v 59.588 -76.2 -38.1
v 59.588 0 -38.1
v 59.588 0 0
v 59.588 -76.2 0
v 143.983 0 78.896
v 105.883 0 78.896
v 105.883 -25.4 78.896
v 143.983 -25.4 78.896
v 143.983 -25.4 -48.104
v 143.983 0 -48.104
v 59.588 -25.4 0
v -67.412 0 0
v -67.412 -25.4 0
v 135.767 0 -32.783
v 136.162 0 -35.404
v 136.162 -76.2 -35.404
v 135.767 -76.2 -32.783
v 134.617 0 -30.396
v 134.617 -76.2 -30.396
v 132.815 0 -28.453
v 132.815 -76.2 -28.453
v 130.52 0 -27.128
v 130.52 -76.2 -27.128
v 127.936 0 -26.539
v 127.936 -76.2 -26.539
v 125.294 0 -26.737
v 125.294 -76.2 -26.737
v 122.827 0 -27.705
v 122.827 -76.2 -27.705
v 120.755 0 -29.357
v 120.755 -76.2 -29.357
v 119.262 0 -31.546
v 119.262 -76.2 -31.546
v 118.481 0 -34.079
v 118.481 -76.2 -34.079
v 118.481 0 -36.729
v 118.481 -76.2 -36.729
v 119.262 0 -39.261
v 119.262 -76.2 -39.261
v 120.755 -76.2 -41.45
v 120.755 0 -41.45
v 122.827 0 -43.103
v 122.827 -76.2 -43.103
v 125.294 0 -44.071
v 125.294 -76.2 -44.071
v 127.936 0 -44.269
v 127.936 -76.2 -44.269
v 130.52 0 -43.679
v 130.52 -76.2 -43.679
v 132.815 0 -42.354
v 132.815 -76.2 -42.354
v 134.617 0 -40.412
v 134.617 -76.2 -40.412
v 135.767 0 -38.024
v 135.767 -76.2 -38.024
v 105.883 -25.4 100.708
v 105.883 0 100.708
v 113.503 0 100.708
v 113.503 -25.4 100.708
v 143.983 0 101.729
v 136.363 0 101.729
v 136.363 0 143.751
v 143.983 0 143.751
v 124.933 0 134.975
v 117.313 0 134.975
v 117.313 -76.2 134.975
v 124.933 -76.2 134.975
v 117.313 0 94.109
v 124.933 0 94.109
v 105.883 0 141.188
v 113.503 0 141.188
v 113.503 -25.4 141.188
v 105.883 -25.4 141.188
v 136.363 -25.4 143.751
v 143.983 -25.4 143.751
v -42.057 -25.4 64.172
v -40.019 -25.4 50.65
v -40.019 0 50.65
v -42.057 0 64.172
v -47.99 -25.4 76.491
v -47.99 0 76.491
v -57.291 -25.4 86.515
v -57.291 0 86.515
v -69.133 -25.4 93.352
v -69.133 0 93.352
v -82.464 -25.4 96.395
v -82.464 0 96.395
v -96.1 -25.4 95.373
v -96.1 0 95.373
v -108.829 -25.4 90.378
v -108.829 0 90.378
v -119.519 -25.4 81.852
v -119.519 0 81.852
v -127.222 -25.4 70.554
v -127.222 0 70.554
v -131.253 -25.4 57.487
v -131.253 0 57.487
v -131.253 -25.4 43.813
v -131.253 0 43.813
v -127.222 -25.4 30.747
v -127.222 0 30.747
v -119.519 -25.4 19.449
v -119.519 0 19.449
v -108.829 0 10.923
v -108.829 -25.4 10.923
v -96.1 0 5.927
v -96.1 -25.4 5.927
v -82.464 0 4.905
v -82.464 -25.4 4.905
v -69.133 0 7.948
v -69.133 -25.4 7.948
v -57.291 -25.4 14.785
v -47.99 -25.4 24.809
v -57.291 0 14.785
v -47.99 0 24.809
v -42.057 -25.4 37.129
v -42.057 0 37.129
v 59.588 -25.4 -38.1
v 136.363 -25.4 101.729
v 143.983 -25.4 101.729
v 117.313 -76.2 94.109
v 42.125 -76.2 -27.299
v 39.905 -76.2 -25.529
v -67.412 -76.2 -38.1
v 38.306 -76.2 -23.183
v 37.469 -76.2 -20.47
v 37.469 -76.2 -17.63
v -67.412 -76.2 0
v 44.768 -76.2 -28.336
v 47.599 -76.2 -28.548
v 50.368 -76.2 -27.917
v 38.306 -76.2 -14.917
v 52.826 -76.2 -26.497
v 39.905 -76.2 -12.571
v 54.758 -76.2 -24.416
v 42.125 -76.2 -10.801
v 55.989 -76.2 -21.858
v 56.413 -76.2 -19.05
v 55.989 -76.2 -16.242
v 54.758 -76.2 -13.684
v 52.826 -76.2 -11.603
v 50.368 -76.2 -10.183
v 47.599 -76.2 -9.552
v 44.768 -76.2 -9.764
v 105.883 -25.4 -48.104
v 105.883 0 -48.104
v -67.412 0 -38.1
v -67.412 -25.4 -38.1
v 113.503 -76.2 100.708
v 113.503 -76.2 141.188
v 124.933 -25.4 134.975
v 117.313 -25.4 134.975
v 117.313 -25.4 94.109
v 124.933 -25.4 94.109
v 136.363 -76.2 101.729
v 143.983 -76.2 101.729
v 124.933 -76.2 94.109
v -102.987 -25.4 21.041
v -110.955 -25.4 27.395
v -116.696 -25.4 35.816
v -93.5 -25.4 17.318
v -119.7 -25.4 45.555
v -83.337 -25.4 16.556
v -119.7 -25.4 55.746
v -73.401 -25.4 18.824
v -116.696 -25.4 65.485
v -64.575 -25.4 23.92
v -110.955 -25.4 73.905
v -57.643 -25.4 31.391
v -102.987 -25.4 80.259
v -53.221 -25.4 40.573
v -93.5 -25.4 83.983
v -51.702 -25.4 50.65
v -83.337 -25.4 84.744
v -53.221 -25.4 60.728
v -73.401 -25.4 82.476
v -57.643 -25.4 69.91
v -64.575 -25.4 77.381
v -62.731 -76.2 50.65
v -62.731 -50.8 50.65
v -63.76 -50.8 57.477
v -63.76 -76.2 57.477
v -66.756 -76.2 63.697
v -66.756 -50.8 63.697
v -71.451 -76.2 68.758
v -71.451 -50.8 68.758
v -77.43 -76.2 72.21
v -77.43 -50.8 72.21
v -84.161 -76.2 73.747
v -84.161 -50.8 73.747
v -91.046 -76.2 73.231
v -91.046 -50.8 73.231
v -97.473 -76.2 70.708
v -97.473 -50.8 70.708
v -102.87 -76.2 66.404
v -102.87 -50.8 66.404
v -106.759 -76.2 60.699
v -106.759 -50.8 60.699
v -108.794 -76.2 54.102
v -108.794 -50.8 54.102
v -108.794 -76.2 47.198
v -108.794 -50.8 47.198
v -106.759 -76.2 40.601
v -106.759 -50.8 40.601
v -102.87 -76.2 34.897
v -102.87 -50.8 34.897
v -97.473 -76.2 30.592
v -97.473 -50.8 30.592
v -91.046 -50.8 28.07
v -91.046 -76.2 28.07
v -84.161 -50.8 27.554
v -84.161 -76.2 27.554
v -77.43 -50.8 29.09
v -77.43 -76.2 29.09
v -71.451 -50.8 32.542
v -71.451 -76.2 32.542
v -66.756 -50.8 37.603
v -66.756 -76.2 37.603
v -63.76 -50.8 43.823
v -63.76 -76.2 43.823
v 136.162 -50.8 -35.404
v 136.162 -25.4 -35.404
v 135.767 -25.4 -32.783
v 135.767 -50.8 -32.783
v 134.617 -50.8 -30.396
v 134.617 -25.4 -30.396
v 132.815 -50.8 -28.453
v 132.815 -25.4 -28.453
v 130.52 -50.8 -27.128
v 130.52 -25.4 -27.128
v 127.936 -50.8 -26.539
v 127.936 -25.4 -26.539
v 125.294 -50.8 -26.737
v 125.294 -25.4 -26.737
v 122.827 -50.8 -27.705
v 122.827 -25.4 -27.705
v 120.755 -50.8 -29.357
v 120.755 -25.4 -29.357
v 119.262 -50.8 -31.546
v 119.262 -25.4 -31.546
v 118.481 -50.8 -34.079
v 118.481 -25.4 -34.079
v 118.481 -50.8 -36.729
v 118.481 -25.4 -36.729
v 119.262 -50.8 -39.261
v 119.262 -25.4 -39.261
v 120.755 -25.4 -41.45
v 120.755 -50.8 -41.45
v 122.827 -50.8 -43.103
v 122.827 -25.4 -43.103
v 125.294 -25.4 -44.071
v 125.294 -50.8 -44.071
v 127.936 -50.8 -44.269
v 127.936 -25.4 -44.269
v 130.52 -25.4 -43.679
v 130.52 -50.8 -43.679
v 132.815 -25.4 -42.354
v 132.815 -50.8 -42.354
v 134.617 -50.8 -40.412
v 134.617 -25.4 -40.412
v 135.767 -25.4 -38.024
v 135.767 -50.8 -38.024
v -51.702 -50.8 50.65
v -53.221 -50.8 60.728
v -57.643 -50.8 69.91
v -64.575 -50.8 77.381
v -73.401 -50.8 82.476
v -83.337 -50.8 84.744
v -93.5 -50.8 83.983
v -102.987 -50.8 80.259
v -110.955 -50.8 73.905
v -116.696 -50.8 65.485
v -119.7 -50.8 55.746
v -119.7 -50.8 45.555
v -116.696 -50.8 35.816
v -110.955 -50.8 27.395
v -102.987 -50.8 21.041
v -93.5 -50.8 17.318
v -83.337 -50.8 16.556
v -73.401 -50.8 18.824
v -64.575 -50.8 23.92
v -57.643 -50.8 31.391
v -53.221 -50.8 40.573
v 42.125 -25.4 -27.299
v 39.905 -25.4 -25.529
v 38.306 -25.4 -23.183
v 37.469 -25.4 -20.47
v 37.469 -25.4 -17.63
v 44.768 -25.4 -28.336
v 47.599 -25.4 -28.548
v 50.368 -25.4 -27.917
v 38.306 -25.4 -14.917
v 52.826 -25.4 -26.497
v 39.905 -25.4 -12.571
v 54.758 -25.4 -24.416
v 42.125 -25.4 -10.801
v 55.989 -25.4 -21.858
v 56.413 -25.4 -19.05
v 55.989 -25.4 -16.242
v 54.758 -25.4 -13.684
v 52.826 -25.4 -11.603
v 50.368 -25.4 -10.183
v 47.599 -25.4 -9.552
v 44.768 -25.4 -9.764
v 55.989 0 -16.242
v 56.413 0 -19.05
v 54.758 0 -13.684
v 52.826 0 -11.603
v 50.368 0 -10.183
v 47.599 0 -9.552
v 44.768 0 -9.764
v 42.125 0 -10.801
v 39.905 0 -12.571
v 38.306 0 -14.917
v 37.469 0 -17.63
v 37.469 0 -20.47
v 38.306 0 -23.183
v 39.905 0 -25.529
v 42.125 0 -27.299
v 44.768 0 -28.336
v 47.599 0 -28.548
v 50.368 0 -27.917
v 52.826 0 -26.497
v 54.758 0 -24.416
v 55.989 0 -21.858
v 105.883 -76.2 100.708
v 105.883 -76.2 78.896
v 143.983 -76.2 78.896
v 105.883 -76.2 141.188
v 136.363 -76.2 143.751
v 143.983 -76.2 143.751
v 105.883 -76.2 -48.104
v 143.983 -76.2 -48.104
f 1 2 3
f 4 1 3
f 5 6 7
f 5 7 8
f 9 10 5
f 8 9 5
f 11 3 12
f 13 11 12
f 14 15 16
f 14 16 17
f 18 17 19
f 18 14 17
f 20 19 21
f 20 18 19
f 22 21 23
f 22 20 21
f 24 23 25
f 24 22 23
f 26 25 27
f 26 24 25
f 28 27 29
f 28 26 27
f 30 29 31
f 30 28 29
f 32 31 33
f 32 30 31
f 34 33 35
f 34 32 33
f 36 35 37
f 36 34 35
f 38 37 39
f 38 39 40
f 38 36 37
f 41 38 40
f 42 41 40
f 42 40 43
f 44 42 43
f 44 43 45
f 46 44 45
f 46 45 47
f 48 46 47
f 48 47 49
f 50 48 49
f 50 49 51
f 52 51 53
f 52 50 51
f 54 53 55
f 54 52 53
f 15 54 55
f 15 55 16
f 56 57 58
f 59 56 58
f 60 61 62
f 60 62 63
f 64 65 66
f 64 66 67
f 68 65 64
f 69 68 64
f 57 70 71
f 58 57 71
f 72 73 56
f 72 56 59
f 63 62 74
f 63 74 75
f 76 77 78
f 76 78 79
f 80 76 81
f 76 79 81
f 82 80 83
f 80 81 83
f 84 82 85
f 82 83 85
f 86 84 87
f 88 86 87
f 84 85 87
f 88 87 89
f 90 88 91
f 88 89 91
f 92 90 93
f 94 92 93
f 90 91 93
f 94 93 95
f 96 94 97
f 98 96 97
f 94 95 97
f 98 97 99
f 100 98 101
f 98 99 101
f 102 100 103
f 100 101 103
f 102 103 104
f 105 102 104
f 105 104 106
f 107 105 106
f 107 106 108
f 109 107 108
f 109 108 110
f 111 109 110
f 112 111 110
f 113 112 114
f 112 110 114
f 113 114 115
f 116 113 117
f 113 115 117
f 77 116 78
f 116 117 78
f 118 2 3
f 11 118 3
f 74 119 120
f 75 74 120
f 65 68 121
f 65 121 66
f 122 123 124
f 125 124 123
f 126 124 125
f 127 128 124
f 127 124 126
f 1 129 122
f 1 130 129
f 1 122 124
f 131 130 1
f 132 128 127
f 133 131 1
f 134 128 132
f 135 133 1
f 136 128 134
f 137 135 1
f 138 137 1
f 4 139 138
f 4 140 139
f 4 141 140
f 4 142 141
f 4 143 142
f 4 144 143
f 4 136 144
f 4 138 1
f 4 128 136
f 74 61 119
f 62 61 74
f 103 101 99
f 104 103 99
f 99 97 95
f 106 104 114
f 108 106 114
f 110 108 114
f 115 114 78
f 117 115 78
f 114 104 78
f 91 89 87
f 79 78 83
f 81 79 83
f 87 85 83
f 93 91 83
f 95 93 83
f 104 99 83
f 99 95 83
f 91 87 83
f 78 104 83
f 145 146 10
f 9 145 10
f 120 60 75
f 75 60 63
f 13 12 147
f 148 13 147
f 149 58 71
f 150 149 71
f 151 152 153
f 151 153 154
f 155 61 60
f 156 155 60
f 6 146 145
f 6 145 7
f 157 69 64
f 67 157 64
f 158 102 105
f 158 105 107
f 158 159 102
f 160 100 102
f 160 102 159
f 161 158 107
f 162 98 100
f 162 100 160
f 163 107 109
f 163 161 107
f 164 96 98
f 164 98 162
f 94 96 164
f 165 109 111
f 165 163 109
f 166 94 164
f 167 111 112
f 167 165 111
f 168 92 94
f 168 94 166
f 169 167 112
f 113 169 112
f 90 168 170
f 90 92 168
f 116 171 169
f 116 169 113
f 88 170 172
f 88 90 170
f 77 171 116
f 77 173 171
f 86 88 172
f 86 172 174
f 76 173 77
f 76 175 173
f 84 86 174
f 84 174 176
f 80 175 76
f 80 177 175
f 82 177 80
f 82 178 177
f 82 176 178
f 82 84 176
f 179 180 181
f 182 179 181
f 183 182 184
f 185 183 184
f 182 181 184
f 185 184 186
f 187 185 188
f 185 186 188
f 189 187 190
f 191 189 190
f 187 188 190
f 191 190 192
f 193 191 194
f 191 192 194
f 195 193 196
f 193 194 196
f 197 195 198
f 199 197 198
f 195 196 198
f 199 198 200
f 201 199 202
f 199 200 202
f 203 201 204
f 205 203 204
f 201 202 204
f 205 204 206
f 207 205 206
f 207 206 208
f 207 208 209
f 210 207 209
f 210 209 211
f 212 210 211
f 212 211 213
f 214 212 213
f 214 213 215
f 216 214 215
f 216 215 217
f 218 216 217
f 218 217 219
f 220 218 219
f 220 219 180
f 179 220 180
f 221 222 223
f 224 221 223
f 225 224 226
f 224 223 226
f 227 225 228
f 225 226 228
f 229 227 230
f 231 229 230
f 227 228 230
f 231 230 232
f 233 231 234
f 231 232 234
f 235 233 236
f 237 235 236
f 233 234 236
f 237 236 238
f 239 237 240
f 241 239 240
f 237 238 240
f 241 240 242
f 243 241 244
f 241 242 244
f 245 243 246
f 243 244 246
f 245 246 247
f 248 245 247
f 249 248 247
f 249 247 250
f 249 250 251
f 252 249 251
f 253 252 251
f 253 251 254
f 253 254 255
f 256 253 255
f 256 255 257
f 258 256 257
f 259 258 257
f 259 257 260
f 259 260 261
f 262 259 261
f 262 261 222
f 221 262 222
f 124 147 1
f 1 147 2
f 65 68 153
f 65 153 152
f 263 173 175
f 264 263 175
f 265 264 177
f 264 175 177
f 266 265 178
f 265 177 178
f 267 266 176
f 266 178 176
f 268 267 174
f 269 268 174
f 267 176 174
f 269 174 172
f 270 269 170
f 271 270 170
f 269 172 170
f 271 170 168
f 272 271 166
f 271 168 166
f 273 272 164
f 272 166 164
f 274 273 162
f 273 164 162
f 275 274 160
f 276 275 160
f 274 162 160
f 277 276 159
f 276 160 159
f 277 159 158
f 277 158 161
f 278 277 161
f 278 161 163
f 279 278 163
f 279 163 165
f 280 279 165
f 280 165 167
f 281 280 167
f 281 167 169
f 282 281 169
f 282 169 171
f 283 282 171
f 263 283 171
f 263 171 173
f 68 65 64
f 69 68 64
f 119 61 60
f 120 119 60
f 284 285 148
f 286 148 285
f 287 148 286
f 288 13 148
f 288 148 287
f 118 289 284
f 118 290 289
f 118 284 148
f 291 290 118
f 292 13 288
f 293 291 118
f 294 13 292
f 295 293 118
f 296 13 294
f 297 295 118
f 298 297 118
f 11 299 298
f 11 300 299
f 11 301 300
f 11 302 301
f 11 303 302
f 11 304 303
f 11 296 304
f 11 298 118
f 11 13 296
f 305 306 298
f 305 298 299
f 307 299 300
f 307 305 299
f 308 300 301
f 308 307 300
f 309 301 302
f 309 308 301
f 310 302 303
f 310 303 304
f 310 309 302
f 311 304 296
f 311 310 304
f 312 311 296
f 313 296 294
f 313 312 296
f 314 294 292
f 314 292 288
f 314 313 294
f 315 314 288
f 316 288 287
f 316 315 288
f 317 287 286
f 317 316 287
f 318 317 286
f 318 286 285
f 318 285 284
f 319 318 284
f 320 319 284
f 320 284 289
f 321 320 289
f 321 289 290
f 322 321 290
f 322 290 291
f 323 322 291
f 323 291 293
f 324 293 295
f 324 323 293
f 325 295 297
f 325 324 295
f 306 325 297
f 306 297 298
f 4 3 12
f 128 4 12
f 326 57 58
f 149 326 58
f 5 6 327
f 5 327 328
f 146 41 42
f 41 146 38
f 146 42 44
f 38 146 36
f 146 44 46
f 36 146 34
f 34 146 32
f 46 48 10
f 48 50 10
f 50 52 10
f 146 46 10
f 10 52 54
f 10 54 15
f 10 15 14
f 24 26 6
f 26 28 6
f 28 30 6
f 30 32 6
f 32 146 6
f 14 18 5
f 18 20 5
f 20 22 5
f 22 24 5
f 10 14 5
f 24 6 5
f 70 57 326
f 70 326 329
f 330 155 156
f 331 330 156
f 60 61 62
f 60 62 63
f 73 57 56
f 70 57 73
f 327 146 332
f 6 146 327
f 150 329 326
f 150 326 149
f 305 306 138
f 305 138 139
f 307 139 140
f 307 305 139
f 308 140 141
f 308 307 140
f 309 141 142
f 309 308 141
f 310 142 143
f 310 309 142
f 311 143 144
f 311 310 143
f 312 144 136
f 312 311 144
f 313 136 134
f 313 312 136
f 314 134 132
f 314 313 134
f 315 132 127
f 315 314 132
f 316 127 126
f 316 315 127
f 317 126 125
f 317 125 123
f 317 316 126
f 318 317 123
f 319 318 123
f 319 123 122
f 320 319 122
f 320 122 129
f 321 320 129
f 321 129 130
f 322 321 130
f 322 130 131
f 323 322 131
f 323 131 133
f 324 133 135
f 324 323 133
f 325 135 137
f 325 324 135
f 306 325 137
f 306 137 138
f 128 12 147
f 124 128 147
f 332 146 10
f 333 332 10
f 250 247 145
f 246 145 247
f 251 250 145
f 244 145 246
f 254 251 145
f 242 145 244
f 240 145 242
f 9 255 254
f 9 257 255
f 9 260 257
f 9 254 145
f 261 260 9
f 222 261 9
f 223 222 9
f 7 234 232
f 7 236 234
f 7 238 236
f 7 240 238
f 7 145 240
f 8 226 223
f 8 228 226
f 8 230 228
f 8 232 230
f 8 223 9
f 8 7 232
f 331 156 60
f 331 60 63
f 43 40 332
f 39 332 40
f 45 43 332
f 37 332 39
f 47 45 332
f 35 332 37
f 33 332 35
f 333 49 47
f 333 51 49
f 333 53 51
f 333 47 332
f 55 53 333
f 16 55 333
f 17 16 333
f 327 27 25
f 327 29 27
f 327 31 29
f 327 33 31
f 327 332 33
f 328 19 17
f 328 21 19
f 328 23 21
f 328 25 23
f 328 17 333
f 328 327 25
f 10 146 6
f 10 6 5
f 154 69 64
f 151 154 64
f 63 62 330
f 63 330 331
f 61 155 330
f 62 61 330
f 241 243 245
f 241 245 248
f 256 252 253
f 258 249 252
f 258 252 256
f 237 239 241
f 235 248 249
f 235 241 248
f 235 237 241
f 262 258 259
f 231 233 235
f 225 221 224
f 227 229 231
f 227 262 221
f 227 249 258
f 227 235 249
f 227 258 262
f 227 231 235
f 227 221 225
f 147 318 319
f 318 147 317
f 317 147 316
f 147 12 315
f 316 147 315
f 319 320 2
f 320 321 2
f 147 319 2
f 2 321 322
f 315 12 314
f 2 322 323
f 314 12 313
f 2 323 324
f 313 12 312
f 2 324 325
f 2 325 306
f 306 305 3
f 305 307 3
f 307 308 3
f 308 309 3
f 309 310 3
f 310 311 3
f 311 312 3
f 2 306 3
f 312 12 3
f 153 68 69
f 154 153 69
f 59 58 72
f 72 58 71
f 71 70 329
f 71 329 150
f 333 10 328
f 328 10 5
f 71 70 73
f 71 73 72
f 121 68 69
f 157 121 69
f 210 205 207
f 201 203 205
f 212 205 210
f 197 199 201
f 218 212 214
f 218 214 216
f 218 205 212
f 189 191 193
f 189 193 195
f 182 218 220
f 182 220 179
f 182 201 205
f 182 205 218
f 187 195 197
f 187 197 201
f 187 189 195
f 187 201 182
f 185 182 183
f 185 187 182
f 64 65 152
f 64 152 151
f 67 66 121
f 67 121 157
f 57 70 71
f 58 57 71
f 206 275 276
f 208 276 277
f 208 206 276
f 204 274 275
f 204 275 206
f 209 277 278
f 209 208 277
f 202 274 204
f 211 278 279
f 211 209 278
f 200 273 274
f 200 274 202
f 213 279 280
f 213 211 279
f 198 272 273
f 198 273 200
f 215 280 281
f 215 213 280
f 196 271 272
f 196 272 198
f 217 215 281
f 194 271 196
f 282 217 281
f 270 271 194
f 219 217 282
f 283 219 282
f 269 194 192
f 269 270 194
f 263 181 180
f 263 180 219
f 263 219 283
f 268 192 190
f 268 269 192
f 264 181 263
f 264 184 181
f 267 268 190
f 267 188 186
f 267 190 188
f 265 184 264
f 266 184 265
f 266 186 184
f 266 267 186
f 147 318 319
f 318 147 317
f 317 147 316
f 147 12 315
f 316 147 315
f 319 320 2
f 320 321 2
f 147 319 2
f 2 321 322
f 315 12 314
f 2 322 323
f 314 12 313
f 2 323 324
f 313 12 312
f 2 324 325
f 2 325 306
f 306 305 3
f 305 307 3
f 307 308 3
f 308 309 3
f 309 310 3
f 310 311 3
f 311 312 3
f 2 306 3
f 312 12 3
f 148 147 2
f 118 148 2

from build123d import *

# Parameters (mm, degrees)
F0_R     = 9.525
F1_DEPTH = 25.4
F0_W     = 38.1
F0_H     = 127
F0_R_2   = 8.89
F2_DEPTH = 25.4
F3_DEPTH = 50.8
F0_W_2   = 7.62
F0_H_2   = 40.47998
F0_H_3   = 40.865489
F0_H_4   = 42.022072
F4_DEPTH = 25.4
F0_R_3   = 23.161046
F5_DEPTH = 76.2
F0_R_4   = 34.189632
F6_DEPTH = 50.8
F0_R_5   = 45.873085
F7_DEPTH = 25.4


with BuildPart() as f1:
    # F0 (on Front) → F1 (new body)
    with BuildSketch(Plane.XZ):
        Polygon((59.587646, 0), (-67.412354, 0), (-67.412354, -38.1), (40.537646, -38.1), (59.587646, -38.1), align=None)
        with Locations((46.887646, -19.05)):
            Circle(F0_R, mode=Mode.SUBTRACT)
    extrude(amount=F1_DEPTH)


with BuildPart() as f2:
    # F0 (on Front) → F2 (new body)
    with BuildSketch(Plane.XZ):
        with Locations((124.932525, 15.396306)):
            Rectangle(F0_W, F0_H)
        with Locations((127.271771, -35.403694)):
            Circle(F0_R_2, mode=Mode.SUBTRACT)
    extrude(amount=F2_DEPTH)

    # F0 (on Front) → F3 (join)
    with BuildSketch(Plane.XZ):
        with Locations((127.271771, -35.403694)):
            Circle(F0_R_2)
    extrude(amount=F3_DEPTH)


with BuildPart() as f4:
    # F0 (on Front) → F4 (new body)
    with BuildSketch(Plane.XZ):
        with Locations((109.692525, 120.948378)):
            Rectangle(F0_W_2, F0_H_2)
        with Locations((121.122525, 114.542018)):
            Rectangle(F0_W_2, F0_H_3)
        with Locations((140.172525, 122.74031)):
            Rectangle(F0_W_2, F0_H_4)
    extrude(amount=F4_DEPTH)


with BuildPart() as f5:
    # F0 (on Front) → F5 (new body)
    with BuildSketch(Plane.XZ):
        with Locations((109.692525, 120.948378)):
            Rectangle(F0_W_2, F0_H_2)
        with Locations((140.172525, 122.74031)):
            Rectangle(F0_W_2, F0_H_4)
        with Locations((121.122525, 114.542018)):
            Rectangle(F0_W_2, F0_H_3)
        Polygon((59.587646, 0), (-67.412354, 0), (-67.412354, -38.1), (40.537646, -38.1), (59.587646, -38.1), align=None)
        with Locations((46.887646, -19.05)):
            Circle(F0_R, mode=Mode.SUBTRACT)
        with Locations((124.932525, 15.396306)):
            Rectangle(F0_W, F0_H)
        with Locations((127.271771, -35.403694)):
            Circle(F0_R_2, mode=Mode.SUBTRACT)
        with Locations((-85.892066, 50.650265)):
            Circle(F0_R_3)
    extrude(amount=F5_DEPTH)

    # F0 (on Front) → F6 (join)
    with BuildSketch(Plane.XZ):
        with Locations((-85.892066, 50.650265)):
            Circle(F0_R_4)
        with Locations((-85.892066, 50.650265)):
            Circle(F0_R_3, mode=Mode.SUBTRACT)
    extrude(amount=F6_DEPTH)

    # F0 (on Front) → F7 (join)
    with BuildSketch(Plane.XZ):
        with Locations((-85.892066, 50.650265)):
            Circle(F0_R_5)
        with Locations((-85.892066, 50.650265)):
            Circle(F0_R_4, mode=Mode.SUBTRACT)
    extrude(amount=F7_DEPTH)


solid = Compound([f1.part, f2.part, f4.part, f5.part])
